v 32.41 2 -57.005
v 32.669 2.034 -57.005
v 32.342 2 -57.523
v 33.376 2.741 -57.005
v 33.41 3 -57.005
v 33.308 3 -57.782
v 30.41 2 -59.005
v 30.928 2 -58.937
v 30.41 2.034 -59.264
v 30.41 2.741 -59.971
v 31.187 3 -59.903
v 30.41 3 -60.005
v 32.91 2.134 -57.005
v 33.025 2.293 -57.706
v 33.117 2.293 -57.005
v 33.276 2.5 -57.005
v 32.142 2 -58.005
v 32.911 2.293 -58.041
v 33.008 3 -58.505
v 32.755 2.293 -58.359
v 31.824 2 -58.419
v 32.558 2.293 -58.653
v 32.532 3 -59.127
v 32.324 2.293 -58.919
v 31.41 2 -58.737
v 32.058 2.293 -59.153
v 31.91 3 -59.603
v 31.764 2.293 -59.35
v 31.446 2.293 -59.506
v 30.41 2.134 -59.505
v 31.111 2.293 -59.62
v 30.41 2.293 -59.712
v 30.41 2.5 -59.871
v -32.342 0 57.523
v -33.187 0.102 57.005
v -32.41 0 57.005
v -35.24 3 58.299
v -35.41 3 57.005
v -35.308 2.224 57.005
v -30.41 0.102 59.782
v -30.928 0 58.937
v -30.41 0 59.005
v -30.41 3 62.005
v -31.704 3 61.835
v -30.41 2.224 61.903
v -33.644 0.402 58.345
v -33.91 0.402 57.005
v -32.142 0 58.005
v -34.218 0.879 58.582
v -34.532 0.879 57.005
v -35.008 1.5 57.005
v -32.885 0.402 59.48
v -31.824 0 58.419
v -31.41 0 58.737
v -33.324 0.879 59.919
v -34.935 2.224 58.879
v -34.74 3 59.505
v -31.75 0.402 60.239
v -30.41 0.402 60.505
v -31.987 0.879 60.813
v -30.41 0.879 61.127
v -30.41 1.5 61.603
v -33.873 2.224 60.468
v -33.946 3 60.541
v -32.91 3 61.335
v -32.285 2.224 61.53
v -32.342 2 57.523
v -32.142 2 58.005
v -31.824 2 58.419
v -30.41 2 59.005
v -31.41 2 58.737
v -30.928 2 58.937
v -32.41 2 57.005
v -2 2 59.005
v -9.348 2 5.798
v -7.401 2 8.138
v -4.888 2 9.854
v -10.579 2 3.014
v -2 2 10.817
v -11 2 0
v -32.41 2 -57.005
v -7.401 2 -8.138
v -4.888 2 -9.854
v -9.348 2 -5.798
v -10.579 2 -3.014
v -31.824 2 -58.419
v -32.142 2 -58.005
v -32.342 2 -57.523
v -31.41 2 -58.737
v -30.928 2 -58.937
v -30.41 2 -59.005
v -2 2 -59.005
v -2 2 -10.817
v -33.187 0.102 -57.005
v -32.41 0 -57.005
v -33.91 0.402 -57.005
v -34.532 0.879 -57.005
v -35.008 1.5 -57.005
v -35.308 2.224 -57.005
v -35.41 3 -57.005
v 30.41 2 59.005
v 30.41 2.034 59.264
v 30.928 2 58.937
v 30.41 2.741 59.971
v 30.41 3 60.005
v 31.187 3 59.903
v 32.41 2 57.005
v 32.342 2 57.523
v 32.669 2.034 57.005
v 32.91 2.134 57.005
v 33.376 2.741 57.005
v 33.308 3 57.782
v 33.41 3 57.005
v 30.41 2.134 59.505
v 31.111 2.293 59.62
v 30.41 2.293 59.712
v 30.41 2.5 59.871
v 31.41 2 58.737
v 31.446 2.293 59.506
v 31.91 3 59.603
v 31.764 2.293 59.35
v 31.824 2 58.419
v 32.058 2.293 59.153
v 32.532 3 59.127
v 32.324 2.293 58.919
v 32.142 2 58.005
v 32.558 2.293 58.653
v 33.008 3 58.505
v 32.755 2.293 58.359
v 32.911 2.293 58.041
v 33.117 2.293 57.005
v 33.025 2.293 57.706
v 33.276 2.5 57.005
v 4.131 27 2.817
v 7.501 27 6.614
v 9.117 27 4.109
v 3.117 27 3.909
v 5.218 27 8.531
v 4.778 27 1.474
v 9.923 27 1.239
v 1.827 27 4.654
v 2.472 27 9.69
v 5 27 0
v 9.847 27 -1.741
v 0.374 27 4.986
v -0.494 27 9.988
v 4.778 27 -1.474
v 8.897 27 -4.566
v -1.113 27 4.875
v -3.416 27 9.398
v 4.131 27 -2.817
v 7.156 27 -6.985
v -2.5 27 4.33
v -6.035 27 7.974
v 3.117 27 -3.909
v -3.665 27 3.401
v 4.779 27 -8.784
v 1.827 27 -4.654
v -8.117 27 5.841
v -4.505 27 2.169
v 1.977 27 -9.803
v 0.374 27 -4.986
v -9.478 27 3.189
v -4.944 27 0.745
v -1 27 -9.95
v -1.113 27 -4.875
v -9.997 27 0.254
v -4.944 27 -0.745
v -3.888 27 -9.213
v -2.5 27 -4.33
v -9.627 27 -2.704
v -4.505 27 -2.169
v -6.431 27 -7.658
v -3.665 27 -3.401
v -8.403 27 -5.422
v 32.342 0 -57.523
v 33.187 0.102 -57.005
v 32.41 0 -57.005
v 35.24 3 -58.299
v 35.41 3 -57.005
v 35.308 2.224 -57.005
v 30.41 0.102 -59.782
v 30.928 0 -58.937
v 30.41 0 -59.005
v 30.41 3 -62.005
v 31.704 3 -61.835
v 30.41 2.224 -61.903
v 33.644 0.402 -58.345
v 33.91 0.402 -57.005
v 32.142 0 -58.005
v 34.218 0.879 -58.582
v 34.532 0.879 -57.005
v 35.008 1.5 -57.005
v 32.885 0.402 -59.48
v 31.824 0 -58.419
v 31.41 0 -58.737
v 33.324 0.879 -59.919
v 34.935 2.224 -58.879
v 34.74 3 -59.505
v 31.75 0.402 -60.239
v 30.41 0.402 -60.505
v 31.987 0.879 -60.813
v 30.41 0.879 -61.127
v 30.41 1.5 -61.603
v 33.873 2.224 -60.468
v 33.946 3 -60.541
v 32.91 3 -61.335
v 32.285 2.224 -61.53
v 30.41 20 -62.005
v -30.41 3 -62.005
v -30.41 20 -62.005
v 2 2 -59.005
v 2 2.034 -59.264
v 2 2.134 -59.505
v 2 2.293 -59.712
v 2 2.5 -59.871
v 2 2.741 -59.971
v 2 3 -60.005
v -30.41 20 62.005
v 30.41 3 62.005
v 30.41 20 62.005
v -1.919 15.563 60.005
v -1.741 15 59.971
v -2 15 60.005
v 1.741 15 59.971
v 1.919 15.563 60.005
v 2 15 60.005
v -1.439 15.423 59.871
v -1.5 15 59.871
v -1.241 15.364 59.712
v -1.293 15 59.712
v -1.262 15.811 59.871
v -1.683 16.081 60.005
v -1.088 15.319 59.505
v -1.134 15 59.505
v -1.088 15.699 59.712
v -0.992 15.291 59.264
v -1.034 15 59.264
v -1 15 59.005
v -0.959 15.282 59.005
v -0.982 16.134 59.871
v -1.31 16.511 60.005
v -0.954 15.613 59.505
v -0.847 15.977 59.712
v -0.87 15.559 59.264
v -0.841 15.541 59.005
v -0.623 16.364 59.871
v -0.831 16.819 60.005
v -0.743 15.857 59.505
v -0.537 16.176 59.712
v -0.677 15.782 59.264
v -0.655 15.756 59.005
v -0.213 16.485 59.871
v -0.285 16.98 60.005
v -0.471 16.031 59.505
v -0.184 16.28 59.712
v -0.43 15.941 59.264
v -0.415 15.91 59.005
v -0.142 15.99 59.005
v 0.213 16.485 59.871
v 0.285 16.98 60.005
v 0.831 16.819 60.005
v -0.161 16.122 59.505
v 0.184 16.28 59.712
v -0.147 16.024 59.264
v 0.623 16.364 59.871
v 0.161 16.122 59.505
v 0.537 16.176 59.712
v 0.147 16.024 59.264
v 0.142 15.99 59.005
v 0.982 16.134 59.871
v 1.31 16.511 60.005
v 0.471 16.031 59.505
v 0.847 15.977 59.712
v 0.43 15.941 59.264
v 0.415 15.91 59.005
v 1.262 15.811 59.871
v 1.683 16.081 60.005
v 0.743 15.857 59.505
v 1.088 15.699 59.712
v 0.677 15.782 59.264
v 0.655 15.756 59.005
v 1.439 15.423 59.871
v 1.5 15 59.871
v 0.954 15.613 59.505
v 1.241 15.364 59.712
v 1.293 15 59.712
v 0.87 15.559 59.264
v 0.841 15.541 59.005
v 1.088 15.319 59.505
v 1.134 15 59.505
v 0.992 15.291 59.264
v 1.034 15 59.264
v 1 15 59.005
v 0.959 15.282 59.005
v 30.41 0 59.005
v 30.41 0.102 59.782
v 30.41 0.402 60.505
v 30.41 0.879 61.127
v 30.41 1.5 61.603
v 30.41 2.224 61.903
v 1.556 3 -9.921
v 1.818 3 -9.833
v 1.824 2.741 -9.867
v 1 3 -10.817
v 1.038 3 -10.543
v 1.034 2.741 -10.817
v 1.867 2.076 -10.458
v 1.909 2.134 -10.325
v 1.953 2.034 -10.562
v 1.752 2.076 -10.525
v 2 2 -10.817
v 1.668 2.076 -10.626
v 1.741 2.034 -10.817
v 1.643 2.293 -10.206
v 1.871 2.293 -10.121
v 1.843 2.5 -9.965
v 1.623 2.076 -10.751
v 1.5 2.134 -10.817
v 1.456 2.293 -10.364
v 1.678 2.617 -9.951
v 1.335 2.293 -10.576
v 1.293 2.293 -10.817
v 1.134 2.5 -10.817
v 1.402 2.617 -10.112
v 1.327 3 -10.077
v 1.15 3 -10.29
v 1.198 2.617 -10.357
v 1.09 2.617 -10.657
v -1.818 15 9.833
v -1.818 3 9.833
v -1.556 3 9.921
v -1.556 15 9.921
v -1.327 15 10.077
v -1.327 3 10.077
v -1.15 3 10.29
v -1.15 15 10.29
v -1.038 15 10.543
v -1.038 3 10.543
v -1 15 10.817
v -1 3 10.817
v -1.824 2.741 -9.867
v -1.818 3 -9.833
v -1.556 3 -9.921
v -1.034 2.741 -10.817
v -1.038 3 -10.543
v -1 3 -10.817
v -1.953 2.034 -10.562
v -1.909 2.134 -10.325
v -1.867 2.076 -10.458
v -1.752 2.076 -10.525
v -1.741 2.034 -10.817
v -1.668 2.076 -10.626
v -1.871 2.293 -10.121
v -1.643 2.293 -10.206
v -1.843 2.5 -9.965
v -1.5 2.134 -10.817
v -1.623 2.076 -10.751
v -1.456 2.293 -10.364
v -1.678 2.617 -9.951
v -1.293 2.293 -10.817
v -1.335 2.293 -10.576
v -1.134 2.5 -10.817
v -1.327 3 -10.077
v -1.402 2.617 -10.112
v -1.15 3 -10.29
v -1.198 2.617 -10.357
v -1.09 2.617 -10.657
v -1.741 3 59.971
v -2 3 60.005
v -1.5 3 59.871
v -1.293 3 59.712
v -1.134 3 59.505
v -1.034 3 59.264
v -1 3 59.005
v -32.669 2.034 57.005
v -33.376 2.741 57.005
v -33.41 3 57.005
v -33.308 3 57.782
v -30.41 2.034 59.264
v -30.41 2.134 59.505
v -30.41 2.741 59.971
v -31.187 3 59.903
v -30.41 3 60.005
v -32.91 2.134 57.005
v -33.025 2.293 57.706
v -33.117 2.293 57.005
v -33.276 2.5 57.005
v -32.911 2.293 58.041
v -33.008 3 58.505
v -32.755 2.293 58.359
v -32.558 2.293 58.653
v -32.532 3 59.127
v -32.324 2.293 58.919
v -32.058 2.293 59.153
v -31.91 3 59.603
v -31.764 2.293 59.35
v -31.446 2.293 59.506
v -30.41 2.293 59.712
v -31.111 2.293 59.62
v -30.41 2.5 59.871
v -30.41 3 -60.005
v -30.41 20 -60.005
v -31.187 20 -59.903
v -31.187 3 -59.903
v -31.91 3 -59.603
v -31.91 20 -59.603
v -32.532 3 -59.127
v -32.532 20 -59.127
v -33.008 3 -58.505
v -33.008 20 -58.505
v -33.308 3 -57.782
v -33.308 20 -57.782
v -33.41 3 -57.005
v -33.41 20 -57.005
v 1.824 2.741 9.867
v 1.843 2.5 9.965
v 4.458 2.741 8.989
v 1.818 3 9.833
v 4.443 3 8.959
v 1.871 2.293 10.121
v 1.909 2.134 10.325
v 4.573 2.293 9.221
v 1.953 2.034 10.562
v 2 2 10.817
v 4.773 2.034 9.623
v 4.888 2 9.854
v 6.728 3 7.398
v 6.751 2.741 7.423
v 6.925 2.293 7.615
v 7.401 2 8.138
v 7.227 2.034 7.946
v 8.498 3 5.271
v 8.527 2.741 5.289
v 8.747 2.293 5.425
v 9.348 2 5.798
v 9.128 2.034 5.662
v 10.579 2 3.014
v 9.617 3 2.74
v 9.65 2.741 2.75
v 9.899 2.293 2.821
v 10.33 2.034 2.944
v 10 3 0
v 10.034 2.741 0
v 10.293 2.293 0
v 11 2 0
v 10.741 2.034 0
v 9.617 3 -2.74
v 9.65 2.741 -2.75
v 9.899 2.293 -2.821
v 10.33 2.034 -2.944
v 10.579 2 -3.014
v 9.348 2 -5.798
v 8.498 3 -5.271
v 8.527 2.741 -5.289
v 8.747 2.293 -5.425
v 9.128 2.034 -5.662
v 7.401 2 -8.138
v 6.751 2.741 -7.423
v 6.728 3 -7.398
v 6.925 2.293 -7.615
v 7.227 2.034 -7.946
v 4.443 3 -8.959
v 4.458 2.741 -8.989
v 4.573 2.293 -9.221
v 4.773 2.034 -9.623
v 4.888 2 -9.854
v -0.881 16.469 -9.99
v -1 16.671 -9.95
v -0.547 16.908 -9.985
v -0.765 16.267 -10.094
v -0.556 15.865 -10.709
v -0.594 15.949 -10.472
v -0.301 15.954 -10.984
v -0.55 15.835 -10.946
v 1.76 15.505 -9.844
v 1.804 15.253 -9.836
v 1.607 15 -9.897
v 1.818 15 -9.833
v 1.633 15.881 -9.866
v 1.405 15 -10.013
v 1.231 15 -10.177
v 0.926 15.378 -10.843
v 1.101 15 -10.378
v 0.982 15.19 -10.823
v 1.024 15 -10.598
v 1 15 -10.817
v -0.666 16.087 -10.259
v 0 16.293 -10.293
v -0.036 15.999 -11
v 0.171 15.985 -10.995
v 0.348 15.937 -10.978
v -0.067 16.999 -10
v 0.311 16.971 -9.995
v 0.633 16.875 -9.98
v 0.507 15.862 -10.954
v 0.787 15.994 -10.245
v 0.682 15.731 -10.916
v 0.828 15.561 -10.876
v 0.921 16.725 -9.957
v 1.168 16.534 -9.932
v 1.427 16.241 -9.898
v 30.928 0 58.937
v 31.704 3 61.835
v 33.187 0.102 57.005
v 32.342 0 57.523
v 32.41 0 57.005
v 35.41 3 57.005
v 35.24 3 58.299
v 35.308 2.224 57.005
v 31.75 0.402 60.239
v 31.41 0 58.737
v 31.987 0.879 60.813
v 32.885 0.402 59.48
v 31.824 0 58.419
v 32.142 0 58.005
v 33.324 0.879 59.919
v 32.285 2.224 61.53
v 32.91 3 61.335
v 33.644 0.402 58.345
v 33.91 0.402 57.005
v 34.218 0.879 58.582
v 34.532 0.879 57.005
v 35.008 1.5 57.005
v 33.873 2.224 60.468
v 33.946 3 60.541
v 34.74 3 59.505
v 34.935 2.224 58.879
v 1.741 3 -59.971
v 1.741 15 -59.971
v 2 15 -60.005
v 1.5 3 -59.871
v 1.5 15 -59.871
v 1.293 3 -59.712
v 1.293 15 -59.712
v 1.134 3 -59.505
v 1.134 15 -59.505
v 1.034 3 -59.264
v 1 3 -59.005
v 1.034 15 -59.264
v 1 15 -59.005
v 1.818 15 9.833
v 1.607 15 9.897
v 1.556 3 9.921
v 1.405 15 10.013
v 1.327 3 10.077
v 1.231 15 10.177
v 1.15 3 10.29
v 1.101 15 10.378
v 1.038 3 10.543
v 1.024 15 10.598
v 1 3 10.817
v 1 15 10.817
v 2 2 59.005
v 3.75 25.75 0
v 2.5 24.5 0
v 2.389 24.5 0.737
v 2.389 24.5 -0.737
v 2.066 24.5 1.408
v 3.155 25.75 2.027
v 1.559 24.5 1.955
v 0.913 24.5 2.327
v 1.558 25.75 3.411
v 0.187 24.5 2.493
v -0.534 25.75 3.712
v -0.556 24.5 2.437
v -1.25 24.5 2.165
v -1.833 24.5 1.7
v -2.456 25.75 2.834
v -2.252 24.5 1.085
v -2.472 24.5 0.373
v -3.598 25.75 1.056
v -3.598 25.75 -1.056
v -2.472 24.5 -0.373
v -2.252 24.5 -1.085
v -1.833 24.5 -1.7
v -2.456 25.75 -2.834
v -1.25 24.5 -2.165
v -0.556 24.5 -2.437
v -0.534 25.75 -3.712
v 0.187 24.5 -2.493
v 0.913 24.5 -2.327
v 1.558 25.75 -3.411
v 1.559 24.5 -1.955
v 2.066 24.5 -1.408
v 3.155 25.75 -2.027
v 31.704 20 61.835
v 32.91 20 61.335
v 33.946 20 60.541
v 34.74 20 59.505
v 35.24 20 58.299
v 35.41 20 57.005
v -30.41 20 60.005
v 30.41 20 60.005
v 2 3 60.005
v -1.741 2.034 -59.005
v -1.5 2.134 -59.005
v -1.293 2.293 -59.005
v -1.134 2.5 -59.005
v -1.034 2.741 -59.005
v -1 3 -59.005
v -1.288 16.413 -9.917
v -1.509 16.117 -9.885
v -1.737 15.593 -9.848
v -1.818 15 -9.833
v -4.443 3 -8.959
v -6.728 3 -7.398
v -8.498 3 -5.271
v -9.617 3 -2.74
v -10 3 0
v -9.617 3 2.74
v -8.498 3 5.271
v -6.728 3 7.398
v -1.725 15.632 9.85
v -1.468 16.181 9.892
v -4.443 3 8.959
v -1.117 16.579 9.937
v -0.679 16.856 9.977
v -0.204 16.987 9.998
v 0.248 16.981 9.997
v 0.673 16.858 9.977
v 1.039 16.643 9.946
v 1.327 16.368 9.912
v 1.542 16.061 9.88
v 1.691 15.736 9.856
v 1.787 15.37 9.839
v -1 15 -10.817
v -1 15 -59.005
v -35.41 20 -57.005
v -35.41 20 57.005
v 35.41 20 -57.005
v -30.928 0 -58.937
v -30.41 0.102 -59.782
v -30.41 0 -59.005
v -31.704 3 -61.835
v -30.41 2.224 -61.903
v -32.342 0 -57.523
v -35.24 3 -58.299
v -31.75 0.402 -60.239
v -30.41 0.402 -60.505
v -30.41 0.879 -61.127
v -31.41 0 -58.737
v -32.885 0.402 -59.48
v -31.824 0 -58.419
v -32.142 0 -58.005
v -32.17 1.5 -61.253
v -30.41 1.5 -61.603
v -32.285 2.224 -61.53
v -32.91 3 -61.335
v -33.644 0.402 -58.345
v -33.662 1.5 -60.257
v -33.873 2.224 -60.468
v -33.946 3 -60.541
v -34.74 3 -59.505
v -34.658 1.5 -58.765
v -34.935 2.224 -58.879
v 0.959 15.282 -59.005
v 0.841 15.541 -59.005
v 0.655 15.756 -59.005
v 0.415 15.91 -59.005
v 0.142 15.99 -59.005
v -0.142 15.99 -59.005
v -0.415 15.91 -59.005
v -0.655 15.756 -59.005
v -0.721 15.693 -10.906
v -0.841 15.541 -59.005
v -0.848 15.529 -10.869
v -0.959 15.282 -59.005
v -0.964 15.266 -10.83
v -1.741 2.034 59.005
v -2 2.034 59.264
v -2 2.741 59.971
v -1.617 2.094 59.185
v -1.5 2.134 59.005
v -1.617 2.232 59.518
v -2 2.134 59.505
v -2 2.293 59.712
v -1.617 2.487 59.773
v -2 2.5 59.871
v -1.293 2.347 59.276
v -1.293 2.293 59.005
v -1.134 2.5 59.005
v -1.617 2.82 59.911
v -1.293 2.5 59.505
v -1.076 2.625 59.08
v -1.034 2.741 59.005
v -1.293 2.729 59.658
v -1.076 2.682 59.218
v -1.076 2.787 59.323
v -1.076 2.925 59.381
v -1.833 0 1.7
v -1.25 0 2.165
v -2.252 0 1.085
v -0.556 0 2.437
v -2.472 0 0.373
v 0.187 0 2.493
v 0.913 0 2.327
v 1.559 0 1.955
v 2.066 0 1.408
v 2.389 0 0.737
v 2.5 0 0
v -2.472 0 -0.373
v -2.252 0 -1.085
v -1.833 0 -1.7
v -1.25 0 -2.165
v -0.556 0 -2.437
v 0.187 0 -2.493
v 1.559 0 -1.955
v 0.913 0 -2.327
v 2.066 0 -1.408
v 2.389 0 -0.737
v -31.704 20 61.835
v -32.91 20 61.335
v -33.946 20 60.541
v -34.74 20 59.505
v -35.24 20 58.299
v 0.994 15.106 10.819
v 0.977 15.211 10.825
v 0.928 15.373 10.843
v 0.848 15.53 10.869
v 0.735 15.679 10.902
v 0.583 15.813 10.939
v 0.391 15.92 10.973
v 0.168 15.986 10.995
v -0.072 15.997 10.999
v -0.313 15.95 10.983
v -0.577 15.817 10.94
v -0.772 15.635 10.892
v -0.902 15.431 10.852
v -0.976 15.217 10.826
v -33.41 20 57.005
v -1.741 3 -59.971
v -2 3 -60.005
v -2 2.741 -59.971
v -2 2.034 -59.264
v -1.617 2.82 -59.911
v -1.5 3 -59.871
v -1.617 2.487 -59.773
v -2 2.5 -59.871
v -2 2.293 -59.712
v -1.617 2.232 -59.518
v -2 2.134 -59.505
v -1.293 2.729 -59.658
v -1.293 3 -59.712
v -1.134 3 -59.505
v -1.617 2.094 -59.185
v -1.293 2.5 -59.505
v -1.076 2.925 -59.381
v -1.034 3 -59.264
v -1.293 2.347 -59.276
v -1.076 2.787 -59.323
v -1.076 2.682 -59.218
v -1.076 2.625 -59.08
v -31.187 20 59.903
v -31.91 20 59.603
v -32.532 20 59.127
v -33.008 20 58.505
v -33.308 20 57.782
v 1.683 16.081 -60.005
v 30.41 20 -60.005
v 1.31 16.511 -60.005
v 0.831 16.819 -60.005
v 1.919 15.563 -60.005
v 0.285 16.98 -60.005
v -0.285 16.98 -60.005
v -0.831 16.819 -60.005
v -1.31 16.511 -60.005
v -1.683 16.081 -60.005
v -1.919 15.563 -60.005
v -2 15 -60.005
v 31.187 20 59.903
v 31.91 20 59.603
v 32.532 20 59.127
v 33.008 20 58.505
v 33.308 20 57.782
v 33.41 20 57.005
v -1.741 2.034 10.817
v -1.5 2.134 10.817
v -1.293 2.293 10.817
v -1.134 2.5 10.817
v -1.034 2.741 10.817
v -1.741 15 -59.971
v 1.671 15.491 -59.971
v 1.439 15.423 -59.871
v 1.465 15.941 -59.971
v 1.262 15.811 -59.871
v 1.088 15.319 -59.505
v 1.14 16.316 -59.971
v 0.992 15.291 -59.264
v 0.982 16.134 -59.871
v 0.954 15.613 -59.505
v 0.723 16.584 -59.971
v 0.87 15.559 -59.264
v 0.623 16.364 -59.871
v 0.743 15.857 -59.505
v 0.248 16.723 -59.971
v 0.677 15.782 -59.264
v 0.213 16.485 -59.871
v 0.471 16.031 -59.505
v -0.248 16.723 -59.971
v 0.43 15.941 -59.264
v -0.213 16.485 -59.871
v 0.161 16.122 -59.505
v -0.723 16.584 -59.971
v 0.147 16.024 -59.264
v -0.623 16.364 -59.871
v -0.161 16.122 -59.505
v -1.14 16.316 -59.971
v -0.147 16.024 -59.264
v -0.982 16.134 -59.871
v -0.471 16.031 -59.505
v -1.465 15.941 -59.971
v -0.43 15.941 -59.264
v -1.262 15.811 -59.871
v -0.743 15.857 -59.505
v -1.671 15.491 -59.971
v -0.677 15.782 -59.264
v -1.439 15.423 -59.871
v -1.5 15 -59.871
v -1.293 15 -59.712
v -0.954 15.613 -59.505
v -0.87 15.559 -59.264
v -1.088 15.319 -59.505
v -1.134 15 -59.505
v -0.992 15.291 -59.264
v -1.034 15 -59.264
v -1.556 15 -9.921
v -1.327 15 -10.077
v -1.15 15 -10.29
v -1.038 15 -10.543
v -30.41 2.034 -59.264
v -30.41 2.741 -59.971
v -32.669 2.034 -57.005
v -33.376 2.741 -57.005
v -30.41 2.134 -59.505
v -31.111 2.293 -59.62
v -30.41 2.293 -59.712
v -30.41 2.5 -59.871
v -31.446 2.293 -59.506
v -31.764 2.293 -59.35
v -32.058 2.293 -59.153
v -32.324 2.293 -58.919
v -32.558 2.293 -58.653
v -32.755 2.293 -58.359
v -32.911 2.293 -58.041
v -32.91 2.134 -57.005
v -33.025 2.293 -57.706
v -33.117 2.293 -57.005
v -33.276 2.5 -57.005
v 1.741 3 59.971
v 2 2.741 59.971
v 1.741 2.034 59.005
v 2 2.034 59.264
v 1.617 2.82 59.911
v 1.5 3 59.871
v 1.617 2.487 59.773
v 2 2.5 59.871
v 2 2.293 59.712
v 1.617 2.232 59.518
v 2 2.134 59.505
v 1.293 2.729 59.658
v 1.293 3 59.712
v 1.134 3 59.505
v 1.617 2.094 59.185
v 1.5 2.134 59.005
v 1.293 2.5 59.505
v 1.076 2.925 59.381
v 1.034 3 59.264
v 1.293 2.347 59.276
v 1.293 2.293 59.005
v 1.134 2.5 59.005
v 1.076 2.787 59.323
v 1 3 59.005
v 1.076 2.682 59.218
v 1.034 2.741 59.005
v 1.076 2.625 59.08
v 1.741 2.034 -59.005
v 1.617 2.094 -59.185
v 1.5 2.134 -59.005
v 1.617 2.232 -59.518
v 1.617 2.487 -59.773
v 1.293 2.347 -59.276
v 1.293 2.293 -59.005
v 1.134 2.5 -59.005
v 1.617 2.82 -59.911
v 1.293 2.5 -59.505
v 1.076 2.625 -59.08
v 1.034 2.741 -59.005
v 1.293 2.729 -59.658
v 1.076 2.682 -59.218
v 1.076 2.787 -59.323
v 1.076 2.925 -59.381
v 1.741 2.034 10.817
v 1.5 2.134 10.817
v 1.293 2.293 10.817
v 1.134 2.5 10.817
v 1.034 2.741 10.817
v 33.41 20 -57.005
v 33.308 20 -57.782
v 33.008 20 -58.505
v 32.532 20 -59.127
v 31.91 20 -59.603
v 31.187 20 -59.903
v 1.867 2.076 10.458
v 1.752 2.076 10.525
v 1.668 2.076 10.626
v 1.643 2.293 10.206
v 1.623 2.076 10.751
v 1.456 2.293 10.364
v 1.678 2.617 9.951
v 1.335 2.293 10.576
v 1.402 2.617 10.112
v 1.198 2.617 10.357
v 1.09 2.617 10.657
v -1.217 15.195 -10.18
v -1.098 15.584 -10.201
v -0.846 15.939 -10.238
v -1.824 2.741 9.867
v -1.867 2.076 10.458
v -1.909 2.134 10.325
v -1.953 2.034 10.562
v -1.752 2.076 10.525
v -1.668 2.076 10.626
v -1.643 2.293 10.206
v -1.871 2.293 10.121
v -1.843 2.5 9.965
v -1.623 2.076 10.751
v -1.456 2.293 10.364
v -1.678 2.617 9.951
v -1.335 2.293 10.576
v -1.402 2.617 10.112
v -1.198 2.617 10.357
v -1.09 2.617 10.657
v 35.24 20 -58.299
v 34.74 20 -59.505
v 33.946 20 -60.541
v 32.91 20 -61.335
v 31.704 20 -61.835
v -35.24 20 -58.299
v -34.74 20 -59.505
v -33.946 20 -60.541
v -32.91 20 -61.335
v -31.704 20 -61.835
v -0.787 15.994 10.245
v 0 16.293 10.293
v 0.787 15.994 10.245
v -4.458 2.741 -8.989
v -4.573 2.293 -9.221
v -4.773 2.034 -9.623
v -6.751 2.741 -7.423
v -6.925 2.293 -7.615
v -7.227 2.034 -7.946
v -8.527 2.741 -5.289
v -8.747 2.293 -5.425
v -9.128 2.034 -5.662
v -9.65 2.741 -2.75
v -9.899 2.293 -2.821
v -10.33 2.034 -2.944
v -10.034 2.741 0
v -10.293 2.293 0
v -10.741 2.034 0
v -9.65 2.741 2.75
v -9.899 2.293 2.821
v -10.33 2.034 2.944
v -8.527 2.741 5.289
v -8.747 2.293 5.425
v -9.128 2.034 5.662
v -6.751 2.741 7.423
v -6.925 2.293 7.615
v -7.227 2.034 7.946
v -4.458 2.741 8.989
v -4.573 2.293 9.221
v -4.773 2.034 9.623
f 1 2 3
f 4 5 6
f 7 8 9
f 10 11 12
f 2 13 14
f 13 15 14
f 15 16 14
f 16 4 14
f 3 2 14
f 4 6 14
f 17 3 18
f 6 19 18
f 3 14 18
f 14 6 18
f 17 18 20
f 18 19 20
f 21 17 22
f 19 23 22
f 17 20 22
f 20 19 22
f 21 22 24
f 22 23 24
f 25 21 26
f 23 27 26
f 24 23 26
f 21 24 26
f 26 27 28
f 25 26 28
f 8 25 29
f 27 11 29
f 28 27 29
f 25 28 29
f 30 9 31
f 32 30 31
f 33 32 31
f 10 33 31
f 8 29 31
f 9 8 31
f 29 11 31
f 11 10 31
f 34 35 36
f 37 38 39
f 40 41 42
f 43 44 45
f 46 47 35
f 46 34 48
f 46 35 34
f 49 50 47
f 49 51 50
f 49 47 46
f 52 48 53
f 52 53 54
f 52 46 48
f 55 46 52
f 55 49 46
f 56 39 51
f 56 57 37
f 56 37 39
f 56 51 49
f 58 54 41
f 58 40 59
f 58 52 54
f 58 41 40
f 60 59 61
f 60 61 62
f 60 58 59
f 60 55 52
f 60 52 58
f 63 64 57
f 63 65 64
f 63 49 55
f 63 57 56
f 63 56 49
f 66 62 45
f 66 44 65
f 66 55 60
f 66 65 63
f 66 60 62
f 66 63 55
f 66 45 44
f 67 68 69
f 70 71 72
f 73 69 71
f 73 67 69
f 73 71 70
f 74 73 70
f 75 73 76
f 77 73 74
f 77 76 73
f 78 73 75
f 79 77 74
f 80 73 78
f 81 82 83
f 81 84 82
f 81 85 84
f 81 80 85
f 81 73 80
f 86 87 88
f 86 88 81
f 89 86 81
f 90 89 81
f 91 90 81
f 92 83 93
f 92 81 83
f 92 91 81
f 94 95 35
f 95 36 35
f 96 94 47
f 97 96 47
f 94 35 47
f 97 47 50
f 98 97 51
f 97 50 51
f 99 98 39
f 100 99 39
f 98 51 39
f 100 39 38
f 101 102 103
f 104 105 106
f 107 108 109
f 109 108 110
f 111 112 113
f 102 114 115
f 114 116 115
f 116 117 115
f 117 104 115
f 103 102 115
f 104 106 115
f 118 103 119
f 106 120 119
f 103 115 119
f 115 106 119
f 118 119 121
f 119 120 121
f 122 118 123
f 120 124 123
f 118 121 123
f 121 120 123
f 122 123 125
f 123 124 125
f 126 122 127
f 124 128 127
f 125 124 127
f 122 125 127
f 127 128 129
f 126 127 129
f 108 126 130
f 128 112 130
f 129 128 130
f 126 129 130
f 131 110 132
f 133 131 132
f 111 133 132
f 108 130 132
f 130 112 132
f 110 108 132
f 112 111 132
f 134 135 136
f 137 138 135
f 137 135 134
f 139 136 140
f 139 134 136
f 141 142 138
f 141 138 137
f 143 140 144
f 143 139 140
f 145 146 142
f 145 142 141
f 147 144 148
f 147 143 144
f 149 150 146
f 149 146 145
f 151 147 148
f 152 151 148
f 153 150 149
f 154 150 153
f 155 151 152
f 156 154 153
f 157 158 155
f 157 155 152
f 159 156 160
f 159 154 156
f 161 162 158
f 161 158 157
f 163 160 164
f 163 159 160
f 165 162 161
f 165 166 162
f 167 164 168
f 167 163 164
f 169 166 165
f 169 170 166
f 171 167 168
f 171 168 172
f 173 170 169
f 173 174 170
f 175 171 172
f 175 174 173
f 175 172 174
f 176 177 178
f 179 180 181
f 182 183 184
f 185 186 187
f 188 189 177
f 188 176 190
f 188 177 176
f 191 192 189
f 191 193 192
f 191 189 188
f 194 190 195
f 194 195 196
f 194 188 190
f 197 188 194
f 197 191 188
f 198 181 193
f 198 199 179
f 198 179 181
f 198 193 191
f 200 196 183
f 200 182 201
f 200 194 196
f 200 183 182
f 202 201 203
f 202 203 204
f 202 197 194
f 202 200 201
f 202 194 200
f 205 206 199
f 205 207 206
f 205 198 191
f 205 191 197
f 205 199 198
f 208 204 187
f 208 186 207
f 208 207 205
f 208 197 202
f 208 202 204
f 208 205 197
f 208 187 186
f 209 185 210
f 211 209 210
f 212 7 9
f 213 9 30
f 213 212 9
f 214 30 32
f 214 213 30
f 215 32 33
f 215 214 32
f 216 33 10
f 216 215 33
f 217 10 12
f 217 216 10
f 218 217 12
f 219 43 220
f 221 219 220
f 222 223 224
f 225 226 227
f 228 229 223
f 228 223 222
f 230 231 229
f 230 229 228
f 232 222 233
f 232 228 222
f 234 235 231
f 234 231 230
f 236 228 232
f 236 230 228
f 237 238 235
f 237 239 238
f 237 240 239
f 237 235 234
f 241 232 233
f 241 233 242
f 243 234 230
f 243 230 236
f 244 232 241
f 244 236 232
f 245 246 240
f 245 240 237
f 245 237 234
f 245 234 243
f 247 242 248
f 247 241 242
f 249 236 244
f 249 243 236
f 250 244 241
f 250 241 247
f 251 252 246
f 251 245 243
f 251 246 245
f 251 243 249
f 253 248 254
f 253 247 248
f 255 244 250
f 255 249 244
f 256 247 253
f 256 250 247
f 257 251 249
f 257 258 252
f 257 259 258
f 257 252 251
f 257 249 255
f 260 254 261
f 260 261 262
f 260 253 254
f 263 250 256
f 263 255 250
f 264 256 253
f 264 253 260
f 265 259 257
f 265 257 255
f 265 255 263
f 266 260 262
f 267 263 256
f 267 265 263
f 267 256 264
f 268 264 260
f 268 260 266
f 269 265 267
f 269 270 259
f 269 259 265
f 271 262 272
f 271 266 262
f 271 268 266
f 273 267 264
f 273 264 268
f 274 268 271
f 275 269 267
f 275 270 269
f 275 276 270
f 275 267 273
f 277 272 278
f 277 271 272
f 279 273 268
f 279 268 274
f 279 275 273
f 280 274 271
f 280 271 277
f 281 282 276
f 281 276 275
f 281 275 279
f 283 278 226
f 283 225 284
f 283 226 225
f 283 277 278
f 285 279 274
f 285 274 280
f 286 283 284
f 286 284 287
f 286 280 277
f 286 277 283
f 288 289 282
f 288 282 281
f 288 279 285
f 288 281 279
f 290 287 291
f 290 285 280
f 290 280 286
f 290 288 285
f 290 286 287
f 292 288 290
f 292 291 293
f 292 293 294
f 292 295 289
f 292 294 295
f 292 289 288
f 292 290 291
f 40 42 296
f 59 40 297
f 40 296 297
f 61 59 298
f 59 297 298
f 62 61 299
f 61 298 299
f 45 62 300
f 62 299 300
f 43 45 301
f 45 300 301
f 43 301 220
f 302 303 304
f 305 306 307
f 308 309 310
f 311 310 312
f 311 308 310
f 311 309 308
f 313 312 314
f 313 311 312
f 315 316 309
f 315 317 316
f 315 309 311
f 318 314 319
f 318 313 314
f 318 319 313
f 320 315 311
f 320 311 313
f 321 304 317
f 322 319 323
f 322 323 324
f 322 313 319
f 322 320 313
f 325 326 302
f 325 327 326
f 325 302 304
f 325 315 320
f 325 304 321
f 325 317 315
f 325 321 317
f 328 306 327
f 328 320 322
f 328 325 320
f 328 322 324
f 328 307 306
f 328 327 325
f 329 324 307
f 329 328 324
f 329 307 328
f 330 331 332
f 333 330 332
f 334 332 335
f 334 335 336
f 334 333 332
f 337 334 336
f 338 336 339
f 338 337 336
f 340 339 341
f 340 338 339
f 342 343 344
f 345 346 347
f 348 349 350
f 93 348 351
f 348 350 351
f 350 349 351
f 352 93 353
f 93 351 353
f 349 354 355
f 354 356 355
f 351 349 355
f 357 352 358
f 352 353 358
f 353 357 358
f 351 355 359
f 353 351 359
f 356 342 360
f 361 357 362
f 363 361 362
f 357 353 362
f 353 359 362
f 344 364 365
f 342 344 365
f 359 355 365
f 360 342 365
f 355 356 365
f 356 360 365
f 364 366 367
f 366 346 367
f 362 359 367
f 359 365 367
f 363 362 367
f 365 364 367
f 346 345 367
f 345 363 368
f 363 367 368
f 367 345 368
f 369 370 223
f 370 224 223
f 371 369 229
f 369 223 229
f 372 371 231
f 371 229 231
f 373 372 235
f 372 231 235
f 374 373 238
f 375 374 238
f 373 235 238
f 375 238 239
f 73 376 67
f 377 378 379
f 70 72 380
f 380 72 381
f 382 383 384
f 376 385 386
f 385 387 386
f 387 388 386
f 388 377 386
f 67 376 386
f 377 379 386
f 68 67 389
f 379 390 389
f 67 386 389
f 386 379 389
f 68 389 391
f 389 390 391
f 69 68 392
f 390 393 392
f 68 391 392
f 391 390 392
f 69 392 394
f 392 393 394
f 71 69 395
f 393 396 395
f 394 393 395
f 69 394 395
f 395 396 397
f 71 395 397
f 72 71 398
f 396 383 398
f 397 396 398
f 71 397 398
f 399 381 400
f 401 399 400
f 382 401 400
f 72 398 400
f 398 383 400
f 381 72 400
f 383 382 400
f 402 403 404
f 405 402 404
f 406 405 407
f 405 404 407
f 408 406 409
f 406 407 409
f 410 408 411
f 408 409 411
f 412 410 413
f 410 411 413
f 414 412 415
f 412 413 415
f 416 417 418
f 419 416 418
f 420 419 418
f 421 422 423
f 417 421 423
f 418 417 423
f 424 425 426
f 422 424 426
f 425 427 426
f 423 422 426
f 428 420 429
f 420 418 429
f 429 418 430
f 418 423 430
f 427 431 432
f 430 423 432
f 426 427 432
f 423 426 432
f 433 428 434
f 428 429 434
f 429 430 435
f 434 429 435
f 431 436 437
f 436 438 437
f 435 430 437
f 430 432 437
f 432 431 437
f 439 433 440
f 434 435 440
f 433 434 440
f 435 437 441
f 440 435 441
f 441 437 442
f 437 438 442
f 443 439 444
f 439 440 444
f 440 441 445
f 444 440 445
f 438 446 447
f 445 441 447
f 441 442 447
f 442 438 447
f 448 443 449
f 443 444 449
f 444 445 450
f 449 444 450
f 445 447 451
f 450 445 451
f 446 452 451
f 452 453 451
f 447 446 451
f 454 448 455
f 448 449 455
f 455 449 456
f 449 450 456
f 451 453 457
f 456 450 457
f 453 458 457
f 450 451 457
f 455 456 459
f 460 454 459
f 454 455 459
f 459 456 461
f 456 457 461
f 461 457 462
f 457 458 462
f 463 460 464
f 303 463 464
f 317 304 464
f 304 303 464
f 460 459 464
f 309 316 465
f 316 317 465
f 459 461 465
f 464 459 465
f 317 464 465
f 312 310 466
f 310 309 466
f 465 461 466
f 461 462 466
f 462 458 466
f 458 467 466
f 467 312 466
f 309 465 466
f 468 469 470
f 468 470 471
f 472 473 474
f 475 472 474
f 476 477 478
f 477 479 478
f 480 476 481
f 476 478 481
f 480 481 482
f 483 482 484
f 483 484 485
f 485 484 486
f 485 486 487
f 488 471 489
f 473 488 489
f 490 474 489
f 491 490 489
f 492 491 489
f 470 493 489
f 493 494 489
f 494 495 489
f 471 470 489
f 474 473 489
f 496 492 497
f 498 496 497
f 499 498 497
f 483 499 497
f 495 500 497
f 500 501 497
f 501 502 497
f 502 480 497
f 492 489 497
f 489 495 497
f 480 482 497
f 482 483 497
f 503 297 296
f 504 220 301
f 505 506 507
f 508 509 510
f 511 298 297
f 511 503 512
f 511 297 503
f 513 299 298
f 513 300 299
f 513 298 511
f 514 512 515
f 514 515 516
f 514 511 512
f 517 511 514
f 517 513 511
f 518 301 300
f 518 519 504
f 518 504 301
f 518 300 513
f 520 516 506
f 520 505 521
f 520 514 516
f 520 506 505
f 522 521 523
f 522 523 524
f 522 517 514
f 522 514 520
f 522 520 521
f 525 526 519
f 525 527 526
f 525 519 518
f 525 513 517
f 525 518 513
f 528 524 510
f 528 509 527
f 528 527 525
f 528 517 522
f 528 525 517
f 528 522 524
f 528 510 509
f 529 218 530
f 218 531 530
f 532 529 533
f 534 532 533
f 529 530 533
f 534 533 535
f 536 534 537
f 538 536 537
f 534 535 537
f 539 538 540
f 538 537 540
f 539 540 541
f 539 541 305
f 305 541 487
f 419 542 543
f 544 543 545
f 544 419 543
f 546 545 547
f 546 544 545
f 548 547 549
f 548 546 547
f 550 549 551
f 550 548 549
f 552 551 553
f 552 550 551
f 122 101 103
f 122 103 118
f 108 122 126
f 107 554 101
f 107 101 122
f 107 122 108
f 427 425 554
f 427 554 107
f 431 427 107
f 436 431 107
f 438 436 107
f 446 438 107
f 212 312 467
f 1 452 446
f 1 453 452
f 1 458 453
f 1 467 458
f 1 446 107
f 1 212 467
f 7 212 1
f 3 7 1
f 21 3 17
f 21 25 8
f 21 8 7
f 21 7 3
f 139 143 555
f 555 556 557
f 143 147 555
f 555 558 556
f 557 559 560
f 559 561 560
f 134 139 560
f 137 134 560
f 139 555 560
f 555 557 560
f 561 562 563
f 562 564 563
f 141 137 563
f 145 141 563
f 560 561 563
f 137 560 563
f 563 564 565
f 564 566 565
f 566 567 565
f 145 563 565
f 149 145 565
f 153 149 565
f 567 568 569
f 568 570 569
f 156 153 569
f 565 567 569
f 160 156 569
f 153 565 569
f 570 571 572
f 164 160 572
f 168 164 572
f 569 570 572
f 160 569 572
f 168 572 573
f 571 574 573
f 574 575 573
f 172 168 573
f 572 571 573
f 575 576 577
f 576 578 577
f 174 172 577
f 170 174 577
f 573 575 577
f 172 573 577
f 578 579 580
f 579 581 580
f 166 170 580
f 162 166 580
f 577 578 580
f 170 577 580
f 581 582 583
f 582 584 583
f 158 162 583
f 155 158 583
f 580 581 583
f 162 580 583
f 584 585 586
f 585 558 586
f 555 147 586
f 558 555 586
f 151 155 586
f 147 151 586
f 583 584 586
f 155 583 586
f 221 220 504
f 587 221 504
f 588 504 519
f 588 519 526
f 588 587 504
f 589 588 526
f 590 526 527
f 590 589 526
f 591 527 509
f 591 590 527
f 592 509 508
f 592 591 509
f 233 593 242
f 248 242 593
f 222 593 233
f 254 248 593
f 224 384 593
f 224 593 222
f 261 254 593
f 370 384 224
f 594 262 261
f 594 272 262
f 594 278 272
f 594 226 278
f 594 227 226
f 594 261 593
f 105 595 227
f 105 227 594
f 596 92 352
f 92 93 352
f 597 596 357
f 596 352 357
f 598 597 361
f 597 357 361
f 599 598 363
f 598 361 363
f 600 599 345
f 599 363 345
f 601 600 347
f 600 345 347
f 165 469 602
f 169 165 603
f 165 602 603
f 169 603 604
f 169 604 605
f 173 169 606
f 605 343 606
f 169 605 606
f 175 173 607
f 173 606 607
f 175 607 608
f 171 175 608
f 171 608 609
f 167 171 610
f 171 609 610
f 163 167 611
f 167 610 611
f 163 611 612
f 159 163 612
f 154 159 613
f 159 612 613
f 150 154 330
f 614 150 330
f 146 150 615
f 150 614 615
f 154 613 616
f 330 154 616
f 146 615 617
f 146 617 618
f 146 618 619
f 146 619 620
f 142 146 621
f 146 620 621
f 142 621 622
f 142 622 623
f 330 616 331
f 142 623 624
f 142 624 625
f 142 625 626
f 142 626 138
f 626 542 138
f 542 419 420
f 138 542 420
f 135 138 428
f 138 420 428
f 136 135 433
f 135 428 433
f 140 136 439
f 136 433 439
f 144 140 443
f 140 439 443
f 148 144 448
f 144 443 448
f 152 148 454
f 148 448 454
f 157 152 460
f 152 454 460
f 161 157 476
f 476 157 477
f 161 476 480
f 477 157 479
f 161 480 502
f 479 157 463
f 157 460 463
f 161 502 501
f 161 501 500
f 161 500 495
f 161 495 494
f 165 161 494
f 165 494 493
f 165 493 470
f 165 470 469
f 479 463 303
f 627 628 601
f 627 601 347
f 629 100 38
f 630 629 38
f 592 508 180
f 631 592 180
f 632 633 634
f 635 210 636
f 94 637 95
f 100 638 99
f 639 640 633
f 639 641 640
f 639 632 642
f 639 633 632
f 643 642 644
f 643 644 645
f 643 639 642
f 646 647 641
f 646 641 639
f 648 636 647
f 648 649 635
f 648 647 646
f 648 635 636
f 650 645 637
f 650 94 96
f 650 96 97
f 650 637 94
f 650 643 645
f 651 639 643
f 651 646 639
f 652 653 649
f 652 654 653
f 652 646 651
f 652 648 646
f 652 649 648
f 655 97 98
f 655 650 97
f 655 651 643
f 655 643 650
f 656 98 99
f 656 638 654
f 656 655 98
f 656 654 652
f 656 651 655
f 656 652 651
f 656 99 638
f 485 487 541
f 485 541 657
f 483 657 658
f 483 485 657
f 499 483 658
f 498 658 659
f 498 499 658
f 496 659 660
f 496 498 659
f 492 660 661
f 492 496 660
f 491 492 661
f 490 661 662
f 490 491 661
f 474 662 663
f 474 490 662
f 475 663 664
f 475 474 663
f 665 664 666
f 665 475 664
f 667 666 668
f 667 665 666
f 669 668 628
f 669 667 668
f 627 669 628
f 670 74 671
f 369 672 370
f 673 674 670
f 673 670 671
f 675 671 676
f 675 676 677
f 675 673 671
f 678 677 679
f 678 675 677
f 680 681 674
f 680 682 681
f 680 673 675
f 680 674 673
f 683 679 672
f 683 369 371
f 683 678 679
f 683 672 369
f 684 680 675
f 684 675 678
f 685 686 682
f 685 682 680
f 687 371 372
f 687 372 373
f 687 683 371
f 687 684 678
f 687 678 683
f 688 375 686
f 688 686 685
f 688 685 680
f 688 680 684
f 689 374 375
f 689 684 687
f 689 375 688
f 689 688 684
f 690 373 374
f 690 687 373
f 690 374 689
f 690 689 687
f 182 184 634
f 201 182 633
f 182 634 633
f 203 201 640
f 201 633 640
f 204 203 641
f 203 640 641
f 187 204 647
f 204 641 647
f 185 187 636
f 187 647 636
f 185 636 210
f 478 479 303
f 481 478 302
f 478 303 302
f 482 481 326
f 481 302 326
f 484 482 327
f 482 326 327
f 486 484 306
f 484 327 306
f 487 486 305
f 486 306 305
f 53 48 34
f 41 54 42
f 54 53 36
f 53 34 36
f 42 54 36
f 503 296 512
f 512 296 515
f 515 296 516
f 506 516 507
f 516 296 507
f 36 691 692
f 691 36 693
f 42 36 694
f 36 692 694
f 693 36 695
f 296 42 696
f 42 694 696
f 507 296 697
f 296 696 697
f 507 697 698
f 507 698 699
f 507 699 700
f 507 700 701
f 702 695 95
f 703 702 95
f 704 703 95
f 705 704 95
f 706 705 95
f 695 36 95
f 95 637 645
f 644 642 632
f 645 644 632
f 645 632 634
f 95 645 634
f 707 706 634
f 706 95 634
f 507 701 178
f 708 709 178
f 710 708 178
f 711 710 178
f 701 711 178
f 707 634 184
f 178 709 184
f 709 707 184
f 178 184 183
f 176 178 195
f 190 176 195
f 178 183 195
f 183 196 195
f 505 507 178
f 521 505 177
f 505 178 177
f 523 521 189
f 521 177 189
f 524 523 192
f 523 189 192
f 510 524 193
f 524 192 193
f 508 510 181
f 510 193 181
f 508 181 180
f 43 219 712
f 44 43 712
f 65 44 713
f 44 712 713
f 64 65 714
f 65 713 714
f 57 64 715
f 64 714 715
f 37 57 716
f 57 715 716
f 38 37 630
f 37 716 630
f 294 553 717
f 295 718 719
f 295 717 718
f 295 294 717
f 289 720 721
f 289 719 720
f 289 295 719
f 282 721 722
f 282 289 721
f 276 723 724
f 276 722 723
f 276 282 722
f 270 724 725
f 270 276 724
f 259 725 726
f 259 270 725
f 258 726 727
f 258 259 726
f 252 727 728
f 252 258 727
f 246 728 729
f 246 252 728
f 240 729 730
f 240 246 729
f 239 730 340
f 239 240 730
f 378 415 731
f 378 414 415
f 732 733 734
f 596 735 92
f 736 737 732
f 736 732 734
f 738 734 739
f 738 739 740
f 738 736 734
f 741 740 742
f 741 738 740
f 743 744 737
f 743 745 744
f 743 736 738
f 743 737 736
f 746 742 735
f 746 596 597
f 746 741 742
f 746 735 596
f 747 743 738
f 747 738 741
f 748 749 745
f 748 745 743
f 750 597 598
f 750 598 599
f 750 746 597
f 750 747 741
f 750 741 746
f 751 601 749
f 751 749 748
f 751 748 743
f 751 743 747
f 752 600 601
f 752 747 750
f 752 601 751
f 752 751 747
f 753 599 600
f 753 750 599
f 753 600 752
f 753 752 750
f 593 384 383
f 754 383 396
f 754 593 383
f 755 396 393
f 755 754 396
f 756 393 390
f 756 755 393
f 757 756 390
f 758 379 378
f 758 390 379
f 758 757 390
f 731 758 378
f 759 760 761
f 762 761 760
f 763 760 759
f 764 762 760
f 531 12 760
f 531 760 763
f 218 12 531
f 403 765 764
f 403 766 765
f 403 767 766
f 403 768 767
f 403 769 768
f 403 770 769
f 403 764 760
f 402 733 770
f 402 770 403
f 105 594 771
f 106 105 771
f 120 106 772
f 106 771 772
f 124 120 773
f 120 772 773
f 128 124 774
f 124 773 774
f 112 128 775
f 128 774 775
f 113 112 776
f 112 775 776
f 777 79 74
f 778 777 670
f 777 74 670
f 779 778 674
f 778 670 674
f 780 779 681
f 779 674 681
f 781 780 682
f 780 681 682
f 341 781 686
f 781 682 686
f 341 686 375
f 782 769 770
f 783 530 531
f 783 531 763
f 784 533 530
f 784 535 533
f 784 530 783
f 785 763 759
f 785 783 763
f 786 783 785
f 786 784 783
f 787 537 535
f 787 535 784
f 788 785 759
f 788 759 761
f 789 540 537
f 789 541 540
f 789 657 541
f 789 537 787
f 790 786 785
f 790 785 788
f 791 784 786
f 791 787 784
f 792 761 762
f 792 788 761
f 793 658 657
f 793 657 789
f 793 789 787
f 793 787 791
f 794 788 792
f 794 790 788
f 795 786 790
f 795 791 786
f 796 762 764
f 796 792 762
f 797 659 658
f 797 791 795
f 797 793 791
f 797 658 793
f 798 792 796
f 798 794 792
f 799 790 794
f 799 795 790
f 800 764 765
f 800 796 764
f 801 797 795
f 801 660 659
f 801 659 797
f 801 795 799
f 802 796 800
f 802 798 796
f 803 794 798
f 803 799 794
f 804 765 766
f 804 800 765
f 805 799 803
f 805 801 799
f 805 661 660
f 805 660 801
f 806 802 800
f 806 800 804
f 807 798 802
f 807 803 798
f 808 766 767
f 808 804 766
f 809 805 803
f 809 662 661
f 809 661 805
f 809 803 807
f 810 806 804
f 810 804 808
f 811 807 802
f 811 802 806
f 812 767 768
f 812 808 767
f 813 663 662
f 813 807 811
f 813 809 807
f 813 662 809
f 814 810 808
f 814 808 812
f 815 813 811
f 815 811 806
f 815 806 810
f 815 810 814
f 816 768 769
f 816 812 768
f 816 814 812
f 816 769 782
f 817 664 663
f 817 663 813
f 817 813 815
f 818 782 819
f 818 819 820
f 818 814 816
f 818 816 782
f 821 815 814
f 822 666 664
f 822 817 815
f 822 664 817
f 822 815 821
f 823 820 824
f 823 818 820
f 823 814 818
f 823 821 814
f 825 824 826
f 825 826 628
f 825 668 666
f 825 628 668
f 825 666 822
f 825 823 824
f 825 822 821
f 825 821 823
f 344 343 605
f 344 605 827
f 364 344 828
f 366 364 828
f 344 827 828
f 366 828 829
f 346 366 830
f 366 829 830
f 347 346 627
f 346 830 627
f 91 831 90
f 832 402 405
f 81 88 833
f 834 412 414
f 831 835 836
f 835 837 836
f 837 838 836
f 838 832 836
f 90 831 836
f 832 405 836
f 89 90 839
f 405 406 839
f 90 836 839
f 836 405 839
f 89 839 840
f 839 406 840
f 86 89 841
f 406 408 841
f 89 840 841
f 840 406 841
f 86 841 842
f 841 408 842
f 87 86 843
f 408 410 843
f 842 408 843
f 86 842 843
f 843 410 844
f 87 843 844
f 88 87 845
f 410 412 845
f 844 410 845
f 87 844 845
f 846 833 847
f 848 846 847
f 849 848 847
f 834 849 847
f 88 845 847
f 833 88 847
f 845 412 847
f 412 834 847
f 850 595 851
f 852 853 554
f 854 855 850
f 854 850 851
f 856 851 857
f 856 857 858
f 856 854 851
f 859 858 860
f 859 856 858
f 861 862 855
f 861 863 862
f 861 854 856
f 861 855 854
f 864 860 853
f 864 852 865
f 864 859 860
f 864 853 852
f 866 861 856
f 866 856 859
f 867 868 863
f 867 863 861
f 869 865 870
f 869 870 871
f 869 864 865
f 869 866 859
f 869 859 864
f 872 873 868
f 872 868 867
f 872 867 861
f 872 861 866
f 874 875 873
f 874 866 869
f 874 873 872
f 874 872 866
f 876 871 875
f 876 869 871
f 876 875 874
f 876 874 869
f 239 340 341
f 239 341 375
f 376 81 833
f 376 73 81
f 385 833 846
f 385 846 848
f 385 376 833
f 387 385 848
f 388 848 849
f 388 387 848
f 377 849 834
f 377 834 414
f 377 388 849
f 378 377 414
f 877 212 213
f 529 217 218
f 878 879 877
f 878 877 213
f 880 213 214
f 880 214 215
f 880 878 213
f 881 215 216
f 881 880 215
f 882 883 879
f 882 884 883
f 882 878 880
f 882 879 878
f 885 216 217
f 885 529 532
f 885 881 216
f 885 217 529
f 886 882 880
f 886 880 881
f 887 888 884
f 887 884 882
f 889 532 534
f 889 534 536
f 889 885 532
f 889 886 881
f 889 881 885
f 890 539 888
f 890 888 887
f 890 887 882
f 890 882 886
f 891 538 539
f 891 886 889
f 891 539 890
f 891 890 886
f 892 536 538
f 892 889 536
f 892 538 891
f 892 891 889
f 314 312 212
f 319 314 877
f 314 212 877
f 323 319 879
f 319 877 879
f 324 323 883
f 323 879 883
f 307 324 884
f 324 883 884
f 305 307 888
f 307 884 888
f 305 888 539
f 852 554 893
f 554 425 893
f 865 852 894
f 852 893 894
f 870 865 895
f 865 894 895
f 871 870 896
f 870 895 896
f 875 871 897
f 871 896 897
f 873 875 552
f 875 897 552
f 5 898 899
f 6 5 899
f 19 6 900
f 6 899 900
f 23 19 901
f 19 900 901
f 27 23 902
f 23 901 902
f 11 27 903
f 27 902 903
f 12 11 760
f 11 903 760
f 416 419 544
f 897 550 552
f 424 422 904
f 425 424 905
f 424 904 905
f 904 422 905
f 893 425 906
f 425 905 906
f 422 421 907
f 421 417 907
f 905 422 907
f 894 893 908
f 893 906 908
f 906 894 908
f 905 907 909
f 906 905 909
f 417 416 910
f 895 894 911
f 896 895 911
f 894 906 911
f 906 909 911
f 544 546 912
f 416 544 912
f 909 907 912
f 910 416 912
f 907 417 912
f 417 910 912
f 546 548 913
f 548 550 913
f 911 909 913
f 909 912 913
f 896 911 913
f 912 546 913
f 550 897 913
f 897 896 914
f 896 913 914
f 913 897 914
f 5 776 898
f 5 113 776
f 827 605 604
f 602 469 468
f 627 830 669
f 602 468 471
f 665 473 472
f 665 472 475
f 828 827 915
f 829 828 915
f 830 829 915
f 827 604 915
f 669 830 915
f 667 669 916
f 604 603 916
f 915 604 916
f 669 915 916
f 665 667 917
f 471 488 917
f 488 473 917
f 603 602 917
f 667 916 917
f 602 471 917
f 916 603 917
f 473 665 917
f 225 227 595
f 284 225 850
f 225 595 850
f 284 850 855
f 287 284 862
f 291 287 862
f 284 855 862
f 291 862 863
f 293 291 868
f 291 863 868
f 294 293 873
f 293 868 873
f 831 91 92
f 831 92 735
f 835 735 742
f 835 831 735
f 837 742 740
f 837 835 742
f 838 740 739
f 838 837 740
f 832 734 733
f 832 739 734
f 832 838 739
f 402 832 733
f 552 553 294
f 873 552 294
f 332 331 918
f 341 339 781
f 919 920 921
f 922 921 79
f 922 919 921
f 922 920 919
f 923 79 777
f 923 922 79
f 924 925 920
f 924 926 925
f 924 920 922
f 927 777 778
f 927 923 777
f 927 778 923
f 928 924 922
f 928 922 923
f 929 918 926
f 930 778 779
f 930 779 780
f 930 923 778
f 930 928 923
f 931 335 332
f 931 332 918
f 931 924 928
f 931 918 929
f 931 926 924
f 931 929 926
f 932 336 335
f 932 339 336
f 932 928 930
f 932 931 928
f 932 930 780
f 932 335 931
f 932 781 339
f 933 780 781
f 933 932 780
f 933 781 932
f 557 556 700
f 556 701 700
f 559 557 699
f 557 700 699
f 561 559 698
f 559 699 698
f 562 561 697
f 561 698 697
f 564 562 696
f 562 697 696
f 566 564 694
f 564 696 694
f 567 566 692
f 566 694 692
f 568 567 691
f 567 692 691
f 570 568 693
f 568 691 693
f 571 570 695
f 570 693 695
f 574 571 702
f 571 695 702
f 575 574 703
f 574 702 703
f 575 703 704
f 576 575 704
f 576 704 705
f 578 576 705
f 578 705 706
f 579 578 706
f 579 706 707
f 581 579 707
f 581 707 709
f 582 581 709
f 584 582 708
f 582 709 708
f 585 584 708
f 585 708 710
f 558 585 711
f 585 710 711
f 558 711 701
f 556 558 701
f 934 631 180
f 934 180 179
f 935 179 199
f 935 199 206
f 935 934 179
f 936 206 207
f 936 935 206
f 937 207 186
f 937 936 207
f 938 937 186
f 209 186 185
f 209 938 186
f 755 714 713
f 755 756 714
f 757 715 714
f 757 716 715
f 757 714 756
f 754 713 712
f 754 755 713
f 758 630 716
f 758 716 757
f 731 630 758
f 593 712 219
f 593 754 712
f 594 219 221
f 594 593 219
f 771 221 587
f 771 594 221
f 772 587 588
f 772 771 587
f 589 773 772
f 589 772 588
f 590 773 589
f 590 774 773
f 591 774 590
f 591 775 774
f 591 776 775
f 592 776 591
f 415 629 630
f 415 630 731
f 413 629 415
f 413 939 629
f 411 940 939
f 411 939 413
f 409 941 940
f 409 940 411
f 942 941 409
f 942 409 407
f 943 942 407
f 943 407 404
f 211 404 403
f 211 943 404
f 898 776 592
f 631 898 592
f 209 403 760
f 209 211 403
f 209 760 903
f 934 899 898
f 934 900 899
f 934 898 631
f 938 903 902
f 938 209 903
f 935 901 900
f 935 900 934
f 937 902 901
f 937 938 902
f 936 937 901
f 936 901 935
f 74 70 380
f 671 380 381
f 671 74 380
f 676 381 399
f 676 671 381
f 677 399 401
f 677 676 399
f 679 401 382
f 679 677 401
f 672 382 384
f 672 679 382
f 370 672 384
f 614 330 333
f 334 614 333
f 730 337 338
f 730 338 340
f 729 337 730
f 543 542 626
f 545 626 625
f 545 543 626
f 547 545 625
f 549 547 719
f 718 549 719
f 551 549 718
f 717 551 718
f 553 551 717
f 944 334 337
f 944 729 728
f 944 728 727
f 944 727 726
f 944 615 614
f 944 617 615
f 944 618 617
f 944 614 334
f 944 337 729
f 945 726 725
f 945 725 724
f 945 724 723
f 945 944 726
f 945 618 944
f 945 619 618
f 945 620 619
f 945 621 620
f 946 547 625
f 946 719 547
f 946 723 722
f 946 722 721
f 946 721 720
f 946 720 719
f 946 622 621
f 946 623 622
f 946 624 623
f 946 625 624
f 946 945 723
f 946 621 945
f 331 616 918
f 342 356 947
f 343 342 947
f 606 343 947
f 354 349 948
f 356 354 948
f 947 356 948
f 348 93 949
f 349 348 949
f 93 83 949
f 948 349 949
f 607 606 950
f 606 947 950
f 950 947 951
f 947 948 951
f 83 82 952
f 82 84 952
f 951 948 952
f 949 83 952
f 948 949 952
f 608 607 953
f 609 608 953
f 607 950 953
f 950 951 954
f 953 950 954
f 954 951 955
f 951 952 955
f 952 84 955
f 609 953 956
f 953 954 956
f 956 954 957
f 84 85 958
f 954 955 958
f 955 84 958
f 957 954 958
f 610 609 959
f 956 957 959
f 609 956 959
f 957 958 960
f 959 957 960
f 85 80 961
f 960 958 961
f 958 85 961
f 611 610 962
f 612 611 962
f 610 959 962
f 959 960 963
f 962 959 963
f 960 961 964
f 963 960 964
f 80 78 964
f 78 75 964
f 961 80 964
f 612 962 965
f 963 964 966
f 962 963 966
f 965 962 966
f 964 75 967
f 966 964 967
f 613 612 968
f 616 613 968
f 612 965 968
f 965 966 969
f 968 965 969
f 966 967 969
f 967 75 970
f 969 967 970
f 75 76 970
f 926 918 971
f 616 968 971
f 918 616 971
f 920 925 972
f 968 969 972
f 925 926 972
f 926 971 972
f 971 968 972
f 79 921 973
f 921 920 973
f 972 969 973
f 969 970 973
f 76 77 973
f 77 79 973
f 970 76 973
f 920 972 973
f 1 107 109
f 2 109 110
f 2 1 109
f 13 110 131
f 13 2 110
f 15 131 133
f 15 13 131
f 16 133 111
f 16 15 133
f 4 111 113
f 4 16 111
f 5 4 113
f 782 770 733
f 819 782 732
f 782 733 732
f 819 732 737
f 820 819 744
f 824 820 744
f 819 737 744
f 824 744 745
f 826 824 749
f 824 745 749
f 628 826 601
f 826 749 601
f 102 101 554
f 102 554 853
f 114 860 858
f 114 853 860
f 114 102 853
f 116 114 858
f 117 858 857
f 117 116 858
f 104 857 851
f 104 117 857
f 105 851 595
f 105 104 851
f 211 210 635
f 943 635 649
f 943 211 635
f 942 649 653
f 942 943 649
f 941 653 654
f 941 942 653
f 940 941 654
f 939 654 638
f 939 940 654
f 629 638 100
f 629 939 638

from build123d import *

# Parameters (mm, degrees)
BASE_EXTRUDE_DEPTH     = 20
FILLET1_R              = 5
FILLET2_R              = 3
SHELL1_T               = -2
RIB1_REACH             = 75.175
SKETCH6_WALLS_W        = 2
SKETCH6_WALLS_H        = 216.25372280356578
FILLET5_RADIUS         = 1
FILLET5_LENGTH         = 120.01036485
SKETCH3_R              = 10
CYLBOSS_DEPTH          = 25
FILLET4_R              = 1
COUNTERSNK_D           = 5
COUNTERSNK_CSINK_D     = 10
COUNTERSNK_CSINK_ANGLE = 90


with BuildPart() as part:
    # Sketch1 → Base-Extrude (new body)
    with BuildSketch(Plane(origin=(0, 0, 0), x_dir=(1, 0, 0), z_dir=(0, 1, 0))):
        Polygon((-35.41024463353893, -62.00518242476961), (35.410244633538916, -62.00518242476961), (35.41024463353893, 62.00518242476959), (-35.41024463353893, 62.00518242476961), align=None)
    extrude(amount=BASE_EXTRUDE_DEPTH)

    # Fillet1
    fillet1_edges = [part.edges().sort_by_distance(p)[0] for p in [
        (-35.41024463353893, 10, 62.00518242476961),
        (35.410244633538916, 10, 62.00518242476961),
        (35.41024463353893, 10, -62.00518242476959),
        (-35.41024463353893, 10, -62.00518242476961),
    ]]
    fillet(fillet1_edges, radius=FILLET1_R)

    # Fillet2
    fillet2_edges = [part.edges().sort_by_distance(p)[0] for p in [
        (-35.41024463353893, 0, 0),
        (0, 0, -62.0051824247696),
        (35.41024463353892, 0, 7.11e-15),
        (-7.11e-15, 0, 62.00518242476961),
        (33.94577853947167, 0, -60.54071633070233),
        (33.945778539471654, 0, 60.540716330702345),
        (-33.94577853947167, 0, 60.540716330702345),
        (-33.94577853947167, 0, -60.540716330702345),
    ]]
    fillet(fillet2_edges, radius=FILLET2_R)

    # Shell1
    shell1_openings = [part.faces().sort_by_distance(p)[0] for p in [
        (0, 20, 0),
    ]]
    offset(amount=SHELL1_T, openings=shell1_openings, kind=Kind.INTERSECTION)

    # Sketch6 walls → Rib1 (add, up to next)
    with BuildSketch(Plane(origin=(0, 16, 0), x_dir=(-1, 0, 0), z_dir=(0, 1, 0)), mode=Mode.PRIVATE) as rib1_sk1:
        with Locations((0, -0.4188286230260019)):
            Rectangle(SKETCH6_WALLS_W, SKETCH6_WALLS_H)
    rib1_tool1 = extrude(rib1_sk1.sketch, amount=-RIB1_REACH, mode=Mode.PRIVATE) - part.part
    add(rib1_tool1.solids().sort_by_distance((0, 16, -0.418828623))[0])

    # Fillet5: full round fillet: the end face becomes a half cylinder, R = half its width
    fillet5_face = Plane((0, 16, 0), x_dir=(0, 0, 1), z_dir=(0, 1, 0))  # on the end face: x along it, z out of the body
    fillet5_slab = fillet5_face.offset(-FILLET5_RADIUS / 2) * Box(FILLET5_LENGTH, 2 * FILLET5_RADIUS, FILLET5_RADIUS, mode=Mode.PRIVATE)  # the body's end, R deep
    fillet5_round = Plane((0, 15, 0), x_dir=(0, 1, 0), z_dir=(0, 0, 1)) * Cylinder(FILLET5_RADIUS, FILLET5_LENGTH, mode=Mode.PRIVATE)  # its axis R under the face
    add(fillet5_slab - fillet5_round, mode=Mode.SUBTRACT)

    # Sketch3 → CylBoss (add)
    with BuildSketch(Plane(origin=(0, 2, 0), x_dir=(-1, 0, 0), z_dir=(0, 1, 0))):
        with Locations(Location((0, 0, 0), (0, 0, 275.739170477))):
            Circle(SKETCH3_R)
    extrude(amount=CYLBOSS_DEPTH)

    # Fillet4
    fillet4_edges = [part.edges().sort_by_distance(p)[0] for p in [
        (1, 9, 60.00518242476961),
        (1, 9, -60.00518242476961),
        (-1, 9, 60.005182424769615),
        (-1, 9, -60.0051824247696),
        (-6e-17, 16, -60.005182425),
        (6e-17, 16, 60.005182425),
        (1, 2, -34.47752839791793),
        (1, 8.5, 9.9498743710662),
        (1, 8.5, -9.9498743710662),
        (-1, 2, -34.47752839792024),
        (-0.9999999999536726, 8.5, -9.949874371070855),
        (4.81118827973e-06, 15.999999999988425, -9.999999999998844),
        (-1, 8.5, 9.9498743710662),
        (-1, 8.5, 9.9498743710662),
        (-10, 2, -2.318834e-11),
        (10, 2, -1.8274e-13),
        (1, 2.292893218813452, 59.712289205956154),
        (-1, 2.292893218813452, 59.712289205956154),
        (1.0000000000000002, 2.292893218813452, -59.712289205956154),
        (-0.9999999999999999, 2.292893218813452, -59.712289205956154),
        (1, 2, 34.4775283979179),
        (-1, 2, 34.47752839791793),
    ]]
    fillet(fillet4_edges, radius=FILLET4_R)

    # CounterSnk (through all)
    with Locations(Plane(origin=(0, 27.000000000000004, 0), x_dir=(-1, 0, 0), z_dir=(0, 1, 0))):
        with Locations((0, 0)):
            CounterSinkHole(COUNTERSNK_D / 2, COUNTERSNK_CSINK_D / 2, counter_sink_angle=COUNTERSNK_CSINK_ANGLE)


solid = part.part
